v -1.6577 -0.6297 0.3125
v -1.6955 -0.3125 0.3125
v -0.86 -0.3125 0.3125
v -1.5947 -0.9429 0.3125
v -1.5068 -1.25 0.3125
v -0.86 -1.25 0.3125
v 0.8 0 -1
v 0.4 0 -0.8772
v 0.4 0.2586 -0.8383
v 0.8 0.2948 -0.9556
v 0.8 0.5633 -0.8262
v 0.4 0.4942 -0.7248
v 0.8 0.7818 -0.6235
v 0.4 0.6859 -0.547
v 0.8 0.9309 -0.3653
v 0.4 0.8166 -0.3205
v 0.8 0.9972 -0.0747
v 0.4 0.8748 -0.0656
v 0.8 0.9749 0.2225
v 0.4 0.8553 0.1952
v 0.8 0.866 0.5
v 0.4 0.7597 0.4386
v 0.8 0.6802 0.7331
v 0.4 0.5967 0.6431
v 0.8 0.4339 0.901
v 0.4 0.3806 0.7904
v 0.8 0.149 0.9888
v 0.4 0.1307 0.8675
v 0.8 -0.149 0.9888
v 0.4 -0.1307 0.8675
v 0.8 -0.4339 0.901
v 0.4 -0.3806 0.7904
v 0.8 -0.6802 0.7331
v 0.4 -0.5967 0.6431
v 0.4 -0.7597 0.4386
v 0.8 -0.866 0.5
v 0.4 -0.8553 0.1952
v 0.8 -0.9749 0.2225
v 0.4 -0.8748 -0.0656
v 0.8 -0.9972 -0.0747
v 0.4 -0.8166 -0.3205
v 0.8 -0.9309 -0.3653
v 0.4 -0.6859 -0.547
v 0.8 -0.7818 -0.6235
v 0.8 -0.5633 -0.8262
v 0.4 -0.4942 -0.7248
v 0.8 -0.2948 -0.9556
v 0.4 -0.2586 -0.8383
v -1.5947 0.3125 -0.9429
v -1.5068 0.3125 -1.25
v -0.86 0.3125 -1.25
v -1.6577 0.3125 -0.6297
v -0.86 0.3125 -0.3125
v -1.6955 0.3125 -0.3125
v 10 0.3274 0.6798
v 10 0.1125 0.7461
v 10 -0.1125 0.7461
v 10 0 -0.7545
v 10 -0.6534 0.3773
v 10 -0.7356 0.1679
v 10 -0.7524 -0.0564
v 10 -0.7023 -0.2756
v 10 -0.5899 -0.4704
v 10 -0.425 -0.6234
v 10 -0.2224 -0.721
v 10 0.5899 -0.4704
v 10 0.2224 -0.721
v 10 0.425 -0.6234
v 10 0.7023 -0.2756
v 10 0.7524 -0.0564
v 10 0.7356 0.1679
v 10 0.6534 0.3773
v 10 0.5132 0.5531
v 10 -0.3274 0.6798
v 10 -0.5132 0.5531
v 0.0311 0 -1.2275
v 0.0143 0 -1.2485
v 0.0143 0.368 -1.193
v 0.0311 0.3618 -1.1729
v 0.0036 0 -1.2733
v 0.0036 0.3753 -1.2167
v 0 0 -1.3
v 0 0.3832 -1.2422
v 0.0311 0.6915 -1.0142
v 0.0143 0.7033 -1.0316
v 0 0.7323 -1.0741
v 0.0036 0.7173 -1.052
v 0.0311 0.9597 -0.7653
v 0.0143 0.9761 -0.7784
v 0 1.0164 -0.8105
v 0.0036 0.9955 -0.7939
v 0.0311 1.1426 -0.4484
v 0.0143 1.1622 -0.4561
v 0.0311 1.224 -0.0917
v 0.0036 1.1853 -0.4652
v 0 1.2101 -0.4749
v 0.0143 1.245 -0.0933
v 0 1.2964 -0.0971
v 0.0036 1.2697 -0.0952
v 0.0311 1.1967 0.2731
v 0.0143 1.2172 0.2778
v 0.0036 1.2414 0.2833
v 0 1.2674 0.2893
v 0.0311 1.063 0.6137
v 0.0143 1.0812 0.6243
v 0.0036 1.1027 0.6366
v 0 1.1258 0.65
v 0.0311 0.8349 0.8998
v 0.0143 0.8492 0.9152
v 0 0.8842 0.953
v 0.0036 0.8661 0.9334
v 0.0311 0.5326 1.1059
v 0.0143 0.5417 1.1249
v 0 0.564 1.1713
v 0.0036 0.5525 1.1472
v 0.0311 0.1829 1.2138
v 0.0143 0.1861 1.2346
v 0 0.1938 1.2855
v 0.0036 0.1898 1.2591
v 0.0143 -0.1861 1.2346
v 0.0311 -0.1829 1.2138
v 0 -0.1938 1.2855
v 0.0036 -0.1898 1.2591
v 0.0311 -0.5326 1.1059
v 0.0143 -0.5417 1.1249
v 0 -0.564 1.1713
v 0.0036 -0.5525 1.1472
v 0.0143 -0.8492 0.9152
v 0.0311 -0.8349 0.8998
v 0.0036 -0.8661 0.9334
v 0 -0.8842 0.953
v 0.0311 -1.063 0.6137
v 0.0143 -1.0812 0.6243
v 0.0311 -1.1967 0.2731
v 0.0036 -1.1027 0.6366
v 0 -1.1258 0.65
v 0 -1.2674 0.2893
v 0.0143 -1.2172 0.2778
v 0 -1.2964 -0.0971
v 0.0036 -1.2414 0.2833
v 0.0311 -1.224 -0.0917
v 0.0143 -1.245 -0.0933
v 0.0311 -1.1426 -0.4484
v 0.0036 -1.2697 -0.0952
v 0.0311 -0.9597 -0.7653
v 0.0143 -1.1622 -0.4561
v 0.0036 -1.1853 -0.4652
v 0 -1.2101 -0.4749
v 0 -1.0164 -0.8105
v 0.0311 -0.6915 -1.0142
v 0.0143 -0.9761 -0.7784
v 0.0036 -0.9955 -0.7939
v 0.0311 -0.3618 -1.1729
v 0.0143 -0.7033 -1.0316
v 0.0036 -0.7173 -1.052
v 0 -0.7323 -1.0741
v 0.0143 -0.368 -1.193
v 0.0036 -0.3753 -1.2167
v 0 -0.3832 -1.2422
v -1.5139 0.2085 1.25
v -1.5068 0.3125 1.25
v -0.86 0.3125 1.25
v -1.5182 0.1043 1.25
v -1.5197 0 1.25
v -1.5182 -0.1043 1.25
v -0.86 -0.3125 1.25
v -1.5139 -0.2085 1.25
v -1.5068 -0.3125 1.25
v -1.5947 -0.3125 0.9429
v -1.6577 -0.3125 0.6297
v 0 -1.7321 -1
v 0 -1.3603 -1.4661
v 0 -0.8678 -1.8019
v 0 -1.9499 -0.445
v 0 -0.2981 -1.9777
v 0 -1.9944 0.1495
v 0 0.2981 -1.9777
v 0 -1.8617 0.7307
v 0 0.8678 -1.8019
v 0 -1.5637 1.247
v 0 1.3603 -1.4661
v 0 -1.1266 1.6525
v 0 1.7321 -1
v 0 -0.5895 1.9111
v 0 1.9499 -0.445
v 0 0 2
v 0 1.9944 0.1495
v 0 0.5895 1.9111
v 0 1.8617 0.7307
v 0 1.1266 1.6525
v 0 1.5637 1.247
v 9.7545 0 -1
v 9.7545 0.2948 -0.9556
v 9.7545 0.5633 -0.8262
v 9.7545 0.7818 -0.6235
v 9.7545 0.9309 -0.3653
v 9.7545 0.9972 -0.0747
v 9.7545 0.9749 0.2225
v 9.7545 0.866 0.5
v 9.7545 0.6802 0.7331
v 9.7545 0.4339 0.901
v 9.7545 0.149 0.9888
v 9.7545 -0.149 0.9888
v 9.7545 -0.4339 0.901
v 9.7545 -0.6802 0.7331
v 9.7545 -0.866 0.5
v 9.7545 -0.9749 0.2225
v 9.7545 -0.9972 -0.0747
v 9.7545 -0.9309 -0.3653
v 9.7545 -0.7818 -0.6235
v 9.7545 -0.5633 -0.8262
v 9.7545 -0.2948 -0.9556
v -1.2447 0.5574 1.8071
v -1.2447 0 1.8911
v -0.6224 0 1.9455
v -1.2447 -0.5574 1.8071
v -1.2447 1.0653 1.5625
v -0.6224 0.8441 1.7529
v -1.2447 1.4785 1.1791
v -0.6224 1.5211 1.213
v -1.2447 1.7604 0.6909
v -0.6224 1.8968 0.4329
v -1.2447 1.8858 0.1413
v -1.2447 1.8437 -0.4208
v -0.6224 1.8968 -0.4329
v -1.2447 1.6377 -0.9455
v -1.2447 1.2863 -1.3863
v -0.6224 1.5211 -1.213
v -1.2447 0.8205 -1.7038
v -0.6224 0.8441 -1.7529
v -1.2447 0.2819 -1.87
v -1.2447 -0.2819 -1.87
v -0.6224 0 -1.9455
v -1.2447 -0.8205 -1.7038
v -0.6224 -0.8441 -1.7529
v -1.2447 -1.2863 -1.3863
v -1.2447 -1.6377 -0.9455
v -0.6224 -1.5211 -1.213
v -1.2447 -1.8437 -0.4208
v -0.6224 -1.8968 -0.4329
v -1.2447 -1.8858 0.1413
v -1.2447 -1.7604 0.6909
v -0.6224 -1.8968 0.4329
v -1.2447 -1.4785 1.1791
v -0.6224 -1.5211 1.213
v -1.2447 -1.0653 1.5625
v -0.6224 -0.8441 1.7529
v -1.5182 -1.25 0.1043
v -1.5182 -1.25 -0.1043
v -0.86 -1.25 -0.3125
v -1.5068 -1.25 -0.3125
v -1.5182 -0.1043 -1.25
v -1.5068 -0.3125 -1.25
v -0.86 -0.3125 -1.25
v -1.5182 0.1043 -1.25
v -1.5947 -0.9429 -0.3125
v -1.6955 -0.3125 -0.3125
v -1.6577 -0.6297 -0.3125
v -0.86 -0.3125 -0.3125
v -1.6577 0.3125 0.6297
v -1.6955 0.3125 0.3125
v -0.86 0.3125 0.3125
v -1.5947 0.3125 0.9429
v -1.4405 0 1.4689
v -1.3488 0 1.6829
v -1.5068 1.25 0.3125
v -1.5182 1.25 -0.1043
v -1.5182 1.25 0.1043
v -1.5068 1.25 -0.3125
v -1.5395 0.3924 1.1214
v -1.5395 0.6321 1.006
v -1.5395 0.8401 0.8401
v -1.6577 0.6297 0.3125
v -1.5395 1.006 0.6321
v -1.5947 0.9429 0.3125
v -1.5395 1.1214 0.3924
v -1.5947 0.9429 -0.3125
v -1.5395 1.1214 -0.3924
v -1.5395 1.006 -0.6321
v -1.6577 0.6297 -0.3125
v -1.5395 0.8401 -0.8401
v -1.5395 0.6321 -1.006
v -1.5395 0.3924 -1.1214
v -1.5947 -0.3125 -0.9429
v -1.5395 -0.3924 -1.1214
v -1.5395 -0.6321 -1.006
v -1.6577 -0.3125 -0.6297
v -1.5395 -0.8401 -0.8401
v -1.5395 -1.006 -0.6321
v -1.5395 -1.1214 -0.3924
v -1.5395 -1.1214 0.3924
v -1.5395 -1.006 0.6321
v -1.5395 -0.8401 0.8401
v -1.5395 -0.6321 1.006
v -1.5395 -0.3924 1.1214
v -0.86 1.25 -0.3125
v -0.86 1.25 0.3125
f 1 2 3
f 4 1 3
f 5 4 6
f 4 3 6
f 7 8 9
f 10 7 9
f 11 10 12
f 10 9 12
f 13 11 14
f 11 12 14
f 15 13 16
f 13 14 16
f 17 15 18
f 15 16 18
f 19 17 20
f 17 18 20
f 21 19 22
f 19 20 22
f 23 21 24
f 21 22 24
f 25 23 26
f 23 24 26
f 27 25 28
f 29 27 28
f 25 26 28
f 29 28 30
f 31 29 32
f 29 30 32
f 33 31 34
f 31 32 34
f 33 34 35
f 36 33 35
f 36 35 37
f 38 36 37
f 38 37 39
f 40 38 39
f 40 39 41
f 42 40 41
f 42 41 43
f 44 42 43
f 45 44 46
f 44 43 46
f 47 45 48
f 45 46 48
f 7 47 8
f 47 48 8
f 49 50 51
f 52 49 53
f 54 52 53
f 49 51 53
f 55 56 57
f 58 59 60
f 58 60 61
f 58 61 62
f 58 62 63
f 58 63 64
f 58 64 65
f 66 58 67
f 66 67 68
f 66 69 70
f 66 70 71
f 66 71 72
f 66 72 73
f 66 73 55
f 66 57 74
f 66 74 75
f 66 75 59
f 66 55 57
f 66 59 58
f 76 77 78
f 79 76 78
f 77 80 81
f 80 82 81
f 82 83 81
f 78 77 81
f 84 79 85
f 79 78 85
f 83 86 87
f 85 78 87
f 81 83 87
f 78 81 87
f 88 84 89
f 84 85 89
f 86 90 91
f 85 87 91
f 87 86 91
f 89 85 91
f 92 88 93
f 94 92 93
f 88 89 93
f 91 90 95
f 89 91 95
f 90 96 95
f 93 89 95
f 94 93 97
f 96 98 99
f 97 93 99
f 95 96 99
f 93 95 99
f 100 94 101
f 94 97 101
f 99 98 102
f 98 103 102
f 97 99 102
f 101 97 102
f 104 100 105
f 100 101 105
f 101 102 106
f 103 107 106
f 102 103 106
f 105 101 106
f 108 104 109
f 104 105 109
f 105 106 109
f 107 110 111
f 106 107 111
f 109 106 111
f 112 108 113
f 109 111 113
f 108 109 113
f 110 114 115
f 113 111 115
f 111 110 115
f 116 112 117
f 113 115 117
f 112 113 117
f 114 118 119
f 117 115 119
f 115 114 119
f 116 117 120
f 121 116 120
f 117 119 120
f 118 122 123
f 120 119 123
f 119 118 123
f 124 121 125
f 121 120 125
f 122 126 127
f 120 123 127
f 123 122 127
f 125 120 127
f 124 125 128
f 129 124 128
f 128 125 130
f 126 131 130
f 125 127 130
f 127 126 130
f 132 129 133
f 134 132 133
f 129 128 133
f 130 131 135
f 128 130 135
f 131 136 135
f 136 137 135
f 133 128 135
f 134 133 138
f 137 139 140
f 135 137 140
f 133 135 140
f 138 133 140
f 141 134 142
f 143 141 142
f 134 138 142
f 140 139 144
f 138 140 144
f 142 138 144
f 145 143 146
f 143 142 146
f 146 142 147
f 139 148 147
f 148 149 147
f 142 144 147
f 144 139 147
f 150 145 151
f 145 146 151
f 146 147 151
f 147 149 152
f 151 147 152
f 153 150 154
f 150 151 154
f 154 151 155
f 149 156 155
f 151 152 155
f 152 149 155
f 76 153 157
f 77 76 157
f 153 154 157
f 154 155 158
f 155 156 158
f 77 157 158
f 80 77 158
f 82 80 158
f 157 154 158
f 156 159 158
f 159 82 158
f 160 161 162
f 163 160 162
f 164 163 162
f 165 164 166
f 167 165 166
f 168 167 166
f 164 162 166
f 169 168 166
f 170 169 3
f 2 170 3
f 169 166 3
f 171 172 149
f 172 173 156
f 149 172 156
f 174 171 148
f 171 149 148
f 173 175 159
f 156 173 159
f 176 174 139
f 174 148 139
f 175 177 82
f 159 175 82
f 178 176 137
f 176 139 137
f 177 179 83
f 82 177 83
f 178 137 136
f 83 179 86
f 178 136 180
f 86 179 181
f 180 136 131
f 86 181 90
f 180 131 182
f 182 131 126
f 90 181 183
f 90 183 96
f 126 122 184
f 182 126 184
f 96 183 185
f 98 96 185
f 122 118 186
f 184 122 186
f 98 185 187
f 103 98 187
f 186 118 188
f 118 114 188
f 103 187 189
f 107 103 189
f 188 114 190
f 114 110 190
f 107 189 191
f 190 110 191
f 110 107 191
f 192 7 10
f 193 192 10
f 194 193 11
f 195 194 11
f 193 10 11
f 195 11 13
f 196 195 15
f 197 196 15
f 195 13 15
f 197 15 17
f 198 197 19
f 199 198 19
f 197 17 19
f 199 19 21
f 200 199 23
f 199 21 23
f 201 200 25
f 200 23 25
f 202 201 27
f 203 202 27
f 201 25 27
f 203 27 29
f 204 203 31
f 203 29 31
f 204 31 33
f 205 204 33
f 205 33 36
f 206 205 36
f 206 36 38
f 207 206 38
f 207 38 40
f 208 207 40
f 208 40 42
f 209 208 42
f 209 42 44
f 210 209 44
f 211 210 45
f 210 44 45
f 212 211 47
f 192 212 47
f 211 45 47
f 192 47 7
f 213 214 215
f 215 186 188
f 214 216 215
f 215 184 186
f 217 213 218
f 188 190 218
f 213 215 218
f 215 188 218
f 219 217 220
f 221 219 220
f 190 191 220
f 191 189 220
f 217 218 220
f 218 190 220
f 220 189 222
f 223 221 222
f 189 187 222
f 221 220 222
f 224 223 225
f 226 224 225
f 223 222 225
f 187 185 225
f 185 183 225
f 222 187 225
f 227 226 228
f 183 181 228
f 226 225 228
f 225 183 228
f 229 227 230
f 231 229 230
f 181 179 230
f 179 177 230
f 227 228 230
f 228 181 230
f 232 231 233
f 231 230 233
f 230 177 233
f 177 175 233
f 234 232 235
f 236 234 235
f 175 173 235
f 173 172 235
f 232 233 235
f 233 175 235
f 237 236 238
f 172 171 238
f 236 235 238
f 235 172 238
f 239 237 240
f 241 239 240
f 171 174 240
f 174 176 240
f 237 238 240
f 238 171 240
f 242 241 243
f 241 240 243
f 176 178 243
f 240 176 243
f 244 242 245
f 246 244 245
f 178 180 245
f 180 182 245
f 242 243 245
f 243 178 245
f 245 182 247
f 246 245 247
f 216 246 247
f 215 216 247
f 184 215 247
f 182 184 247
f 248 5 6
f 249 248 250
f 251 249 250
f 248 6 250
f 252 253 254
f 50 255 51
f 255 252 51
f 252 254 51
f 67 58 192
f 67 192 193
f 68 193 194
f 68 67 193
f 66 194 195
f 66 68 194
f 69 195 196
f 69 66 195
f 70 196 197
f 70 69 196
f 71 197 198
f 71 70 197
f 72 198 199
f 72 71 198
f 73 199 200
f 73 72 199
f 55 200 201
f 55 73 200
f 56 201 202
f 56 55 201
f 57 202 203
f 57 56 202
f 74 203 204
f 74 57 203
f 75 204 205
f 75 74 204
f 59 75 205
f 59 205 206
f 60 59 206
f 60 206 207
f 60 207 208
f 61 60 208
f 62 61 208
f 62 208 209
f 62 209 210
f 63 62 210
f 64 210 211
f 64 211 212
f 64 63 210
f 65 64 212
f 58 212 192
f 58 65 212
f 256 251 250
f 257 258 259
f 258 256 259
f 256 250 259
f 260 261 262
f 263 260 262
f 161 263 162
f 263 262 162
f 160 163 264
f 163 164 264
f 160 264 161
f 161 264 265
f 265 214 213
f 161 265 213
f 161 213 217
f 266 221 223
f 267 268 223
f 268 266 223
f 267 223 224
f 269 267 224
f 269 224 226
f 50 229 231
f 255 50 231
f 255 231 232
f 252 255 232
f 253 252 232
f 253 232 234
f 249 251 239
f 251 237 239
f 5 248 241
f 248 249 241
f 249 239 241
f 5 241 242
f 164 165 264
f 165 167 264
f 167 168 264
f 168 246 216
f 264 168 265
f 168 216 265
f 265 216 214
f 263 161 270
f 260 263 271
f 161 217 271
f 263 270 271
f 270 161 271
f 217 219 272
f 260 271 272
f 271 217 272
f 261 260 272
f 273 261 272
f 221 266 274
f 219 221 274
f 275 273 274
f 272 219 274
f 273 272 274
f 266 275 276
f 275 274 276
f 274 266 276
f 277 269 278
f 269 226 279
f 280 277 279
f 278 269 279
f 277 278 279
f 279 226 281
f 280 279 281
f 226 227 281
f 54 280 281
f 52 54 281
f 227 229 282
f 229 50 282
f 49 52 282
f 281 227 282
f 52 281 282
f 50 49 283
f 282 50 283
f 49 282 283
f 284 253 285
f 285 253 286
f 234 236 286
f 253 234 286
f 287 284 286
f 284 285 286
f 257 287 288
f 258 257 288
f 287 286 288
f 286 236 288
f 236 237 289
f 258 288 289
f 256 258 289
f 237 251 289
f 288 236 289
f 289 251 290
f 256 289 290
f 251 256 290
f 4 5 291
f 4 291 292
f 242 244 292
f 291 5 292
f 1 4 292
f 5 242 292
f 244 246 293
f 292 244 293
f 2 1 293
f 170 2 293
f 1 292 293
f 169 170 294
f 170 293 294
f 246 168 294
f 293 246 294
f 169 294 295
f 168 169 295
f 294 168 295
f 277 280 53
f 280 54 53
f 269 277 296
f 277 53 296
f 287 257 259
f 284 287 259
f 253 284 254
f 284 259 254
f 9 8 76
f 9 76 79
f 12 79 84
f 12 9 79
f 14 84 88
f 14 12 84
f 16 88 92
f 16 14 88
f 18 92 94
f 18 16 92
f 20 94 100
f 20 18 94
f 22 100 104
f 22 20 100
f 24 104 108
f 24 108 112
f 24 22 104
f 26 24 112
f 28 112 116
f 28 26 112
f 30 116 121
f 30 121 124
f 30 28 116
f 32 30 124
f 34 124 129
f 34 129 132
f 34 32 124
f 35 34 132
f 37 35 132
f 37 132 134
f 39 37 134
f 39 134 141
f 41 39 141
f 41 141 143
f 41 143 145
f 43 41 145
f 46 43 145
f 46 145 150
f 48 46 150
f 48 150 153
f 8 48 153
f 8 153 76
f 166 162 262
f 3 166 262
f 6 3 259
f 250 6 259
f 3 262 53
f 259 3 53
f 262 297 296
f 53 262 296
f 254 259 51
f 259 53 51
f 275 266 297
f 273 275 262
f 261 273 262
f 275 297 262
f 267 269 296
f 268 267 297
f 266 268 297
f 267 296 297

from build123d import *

# Parameters (mm, degrees)
SKETCH2_R               = 1.257053568
BOSS_EXTRUDE1_DEPTH     = 0.4
BOSS_EXTRUDE1_TAPER     = 43.516406292
SKETCH3_R               = 0.87725
BOSS_EXTRUDE2_DEPTH     = 0.4
BOSS_EXTRUDE2_DRAFT     = -17.059940879
SKETCH4_R               = 1
BOSS_EXTRUDE3_DEPTH     = 9.2
CUT_EXTRUDE1_REACH      = 13.222
CUT_EXTRUDE1_END_RADIUS = 4
CHAMFER1_SIZE           = 0.2455
FILLET1_R               = 0.1


with BuildPart() as part:
    # Sketch1 → Revolve1 (revolve)
    with BuildSketch(Plane(origin=(0, 0, 0), x_dir=(-1, 0, 0), z_dir=(0, 0, -1)), mode=Mode.PRIVATE) as revolve1_sk:
        with BuildLine():
            Line((0, 2), (0, 0))
            Line((0, 0), (1.72, 0))
            ThreePointArc((1.72, 0), (1.599364053, 0.974953612), (1.244732728, 1.891099997))
            Line((1.244732728, 1.891099997), (0, 2))
        make_face()
    revolve(revolve1_sk.sketch.rotate(Axis((0, 0, 0), (-1, 0, 0)), 270), axis=Axis((0, 0, 0), (-1, 0, 0)))

    # Sketch2 → Boss-Extrude1 (add)
    with BuildSketch(Plane(origin=(0, 0, 0), x_dir=(0, 0, -1), z_dir=(1, 0, 0))):
        Circle(SKETCH2_R)
    extrude(amount=BOSS_EXTRUDE1_DEPTH, taper=BOSS_EXTRUDE1_TAPER)


with BuildPart() as boss_extrude2_tool:
    # Sketch3 → Boss-Extrude2 (with draft: the straight prism first)
    with BuildSketch(Plane(origin=(0.4, 0, 0), x_dir=(0, 0, -1), z_dir=(1, 0, 0))):
        Circle(SKETCH3_R)
    extrude(amount=BOSS_EXTRUDE2_DEPTH)
    # Boss-Extrude2: the draft: its side faces are tilted about the plane it starts from
    boss_extrude2_sides = [boss_extrude2_tool.faces().sort_by_distance(p)[0] for p in [
        (0.6, 0, 0.87725),
    ]]
    draft(boss_extrude2_sides, Plane(origin=(0.4, 0, 0), x_dir=(0, 0, -1), z_dir=(1, 0, 0)), BOSS_EXTRUDE2_DRAFT)


with BuildPart() as part_1:
    add(part.part)

    # Boss-Extrude2: add boss_extrude2_tool
    add(boss_extrude2_tool.part)

    # Sketch4 → Boss-Extrude3 (add)
    with BuildSketch(Plane(origin=(0.8, 0, 0), x_dir=(0, 0, -1), z_dir=(1, 0, 0))):
        Circle(SKETCH4_R)
    extrude(amount=BOSS_EXTRUDE3_DEPTH)

    # Cut-Extrude1: up to this sphere (the profile starts inside it)
    cut_extrude1_end = Location((2.28, 0, 0)) * Sphere(CUT_EXTRUDE1_END_RADIUS, mode=Mode.PRIVATE)
    # Sketch5 → Cut-Extrude1 (cut, up to the surface)
    with BuildSketch(Plane(origin=(-0.86, 0, 0), x_dir=(0, 0, -1), z_dir=(1, 0, 0)), mode=Mode.PRIVATE) as cut_extrude1_sk1:
        Polygon((0.3125, 0.3125), (0.3125, 1.25), (-0.3125, 1.25), (-0.3125, 0.3125), (-1.25, 0.3125), (-1.25, -0.3125), (-0.3125, -0.3125), (-0.3125, -1.25), (0.3125, -1.25), (0.3125, -0.3125), (1.25, -0.3125), (1.25, 0.3125), align=None)
    cut_extrude1_tool1 = extrude(cut_extrude1_sk1.sketch, amount=-CUT_EXTRUDE1_REACH, mode=Mode.PRIVATE) & cut_extrude1_end
    add(cut_extrude1_tool1.solids().sort_by_distance((-0.86, 0, 0))[0], mode=Mode.SUBTRACT)

    # Chamfer1
    chamfer1_edges = [part_1.edges().sort_by_distance(p)[0] for p in [
        (10, 0, 1),
    ]]
    chamfer(chamfer1_edges, length=CHAMFER1_SIZE)

    # Fillet1
    fillet1_edges = [part_1.edges().sort_by_distance(p)[0] for p in [
        (0, 0, 1.257053568),
    ]]
    fillet(fillet1_edges, radius=FILLET1_R)


solid = part_1.part
